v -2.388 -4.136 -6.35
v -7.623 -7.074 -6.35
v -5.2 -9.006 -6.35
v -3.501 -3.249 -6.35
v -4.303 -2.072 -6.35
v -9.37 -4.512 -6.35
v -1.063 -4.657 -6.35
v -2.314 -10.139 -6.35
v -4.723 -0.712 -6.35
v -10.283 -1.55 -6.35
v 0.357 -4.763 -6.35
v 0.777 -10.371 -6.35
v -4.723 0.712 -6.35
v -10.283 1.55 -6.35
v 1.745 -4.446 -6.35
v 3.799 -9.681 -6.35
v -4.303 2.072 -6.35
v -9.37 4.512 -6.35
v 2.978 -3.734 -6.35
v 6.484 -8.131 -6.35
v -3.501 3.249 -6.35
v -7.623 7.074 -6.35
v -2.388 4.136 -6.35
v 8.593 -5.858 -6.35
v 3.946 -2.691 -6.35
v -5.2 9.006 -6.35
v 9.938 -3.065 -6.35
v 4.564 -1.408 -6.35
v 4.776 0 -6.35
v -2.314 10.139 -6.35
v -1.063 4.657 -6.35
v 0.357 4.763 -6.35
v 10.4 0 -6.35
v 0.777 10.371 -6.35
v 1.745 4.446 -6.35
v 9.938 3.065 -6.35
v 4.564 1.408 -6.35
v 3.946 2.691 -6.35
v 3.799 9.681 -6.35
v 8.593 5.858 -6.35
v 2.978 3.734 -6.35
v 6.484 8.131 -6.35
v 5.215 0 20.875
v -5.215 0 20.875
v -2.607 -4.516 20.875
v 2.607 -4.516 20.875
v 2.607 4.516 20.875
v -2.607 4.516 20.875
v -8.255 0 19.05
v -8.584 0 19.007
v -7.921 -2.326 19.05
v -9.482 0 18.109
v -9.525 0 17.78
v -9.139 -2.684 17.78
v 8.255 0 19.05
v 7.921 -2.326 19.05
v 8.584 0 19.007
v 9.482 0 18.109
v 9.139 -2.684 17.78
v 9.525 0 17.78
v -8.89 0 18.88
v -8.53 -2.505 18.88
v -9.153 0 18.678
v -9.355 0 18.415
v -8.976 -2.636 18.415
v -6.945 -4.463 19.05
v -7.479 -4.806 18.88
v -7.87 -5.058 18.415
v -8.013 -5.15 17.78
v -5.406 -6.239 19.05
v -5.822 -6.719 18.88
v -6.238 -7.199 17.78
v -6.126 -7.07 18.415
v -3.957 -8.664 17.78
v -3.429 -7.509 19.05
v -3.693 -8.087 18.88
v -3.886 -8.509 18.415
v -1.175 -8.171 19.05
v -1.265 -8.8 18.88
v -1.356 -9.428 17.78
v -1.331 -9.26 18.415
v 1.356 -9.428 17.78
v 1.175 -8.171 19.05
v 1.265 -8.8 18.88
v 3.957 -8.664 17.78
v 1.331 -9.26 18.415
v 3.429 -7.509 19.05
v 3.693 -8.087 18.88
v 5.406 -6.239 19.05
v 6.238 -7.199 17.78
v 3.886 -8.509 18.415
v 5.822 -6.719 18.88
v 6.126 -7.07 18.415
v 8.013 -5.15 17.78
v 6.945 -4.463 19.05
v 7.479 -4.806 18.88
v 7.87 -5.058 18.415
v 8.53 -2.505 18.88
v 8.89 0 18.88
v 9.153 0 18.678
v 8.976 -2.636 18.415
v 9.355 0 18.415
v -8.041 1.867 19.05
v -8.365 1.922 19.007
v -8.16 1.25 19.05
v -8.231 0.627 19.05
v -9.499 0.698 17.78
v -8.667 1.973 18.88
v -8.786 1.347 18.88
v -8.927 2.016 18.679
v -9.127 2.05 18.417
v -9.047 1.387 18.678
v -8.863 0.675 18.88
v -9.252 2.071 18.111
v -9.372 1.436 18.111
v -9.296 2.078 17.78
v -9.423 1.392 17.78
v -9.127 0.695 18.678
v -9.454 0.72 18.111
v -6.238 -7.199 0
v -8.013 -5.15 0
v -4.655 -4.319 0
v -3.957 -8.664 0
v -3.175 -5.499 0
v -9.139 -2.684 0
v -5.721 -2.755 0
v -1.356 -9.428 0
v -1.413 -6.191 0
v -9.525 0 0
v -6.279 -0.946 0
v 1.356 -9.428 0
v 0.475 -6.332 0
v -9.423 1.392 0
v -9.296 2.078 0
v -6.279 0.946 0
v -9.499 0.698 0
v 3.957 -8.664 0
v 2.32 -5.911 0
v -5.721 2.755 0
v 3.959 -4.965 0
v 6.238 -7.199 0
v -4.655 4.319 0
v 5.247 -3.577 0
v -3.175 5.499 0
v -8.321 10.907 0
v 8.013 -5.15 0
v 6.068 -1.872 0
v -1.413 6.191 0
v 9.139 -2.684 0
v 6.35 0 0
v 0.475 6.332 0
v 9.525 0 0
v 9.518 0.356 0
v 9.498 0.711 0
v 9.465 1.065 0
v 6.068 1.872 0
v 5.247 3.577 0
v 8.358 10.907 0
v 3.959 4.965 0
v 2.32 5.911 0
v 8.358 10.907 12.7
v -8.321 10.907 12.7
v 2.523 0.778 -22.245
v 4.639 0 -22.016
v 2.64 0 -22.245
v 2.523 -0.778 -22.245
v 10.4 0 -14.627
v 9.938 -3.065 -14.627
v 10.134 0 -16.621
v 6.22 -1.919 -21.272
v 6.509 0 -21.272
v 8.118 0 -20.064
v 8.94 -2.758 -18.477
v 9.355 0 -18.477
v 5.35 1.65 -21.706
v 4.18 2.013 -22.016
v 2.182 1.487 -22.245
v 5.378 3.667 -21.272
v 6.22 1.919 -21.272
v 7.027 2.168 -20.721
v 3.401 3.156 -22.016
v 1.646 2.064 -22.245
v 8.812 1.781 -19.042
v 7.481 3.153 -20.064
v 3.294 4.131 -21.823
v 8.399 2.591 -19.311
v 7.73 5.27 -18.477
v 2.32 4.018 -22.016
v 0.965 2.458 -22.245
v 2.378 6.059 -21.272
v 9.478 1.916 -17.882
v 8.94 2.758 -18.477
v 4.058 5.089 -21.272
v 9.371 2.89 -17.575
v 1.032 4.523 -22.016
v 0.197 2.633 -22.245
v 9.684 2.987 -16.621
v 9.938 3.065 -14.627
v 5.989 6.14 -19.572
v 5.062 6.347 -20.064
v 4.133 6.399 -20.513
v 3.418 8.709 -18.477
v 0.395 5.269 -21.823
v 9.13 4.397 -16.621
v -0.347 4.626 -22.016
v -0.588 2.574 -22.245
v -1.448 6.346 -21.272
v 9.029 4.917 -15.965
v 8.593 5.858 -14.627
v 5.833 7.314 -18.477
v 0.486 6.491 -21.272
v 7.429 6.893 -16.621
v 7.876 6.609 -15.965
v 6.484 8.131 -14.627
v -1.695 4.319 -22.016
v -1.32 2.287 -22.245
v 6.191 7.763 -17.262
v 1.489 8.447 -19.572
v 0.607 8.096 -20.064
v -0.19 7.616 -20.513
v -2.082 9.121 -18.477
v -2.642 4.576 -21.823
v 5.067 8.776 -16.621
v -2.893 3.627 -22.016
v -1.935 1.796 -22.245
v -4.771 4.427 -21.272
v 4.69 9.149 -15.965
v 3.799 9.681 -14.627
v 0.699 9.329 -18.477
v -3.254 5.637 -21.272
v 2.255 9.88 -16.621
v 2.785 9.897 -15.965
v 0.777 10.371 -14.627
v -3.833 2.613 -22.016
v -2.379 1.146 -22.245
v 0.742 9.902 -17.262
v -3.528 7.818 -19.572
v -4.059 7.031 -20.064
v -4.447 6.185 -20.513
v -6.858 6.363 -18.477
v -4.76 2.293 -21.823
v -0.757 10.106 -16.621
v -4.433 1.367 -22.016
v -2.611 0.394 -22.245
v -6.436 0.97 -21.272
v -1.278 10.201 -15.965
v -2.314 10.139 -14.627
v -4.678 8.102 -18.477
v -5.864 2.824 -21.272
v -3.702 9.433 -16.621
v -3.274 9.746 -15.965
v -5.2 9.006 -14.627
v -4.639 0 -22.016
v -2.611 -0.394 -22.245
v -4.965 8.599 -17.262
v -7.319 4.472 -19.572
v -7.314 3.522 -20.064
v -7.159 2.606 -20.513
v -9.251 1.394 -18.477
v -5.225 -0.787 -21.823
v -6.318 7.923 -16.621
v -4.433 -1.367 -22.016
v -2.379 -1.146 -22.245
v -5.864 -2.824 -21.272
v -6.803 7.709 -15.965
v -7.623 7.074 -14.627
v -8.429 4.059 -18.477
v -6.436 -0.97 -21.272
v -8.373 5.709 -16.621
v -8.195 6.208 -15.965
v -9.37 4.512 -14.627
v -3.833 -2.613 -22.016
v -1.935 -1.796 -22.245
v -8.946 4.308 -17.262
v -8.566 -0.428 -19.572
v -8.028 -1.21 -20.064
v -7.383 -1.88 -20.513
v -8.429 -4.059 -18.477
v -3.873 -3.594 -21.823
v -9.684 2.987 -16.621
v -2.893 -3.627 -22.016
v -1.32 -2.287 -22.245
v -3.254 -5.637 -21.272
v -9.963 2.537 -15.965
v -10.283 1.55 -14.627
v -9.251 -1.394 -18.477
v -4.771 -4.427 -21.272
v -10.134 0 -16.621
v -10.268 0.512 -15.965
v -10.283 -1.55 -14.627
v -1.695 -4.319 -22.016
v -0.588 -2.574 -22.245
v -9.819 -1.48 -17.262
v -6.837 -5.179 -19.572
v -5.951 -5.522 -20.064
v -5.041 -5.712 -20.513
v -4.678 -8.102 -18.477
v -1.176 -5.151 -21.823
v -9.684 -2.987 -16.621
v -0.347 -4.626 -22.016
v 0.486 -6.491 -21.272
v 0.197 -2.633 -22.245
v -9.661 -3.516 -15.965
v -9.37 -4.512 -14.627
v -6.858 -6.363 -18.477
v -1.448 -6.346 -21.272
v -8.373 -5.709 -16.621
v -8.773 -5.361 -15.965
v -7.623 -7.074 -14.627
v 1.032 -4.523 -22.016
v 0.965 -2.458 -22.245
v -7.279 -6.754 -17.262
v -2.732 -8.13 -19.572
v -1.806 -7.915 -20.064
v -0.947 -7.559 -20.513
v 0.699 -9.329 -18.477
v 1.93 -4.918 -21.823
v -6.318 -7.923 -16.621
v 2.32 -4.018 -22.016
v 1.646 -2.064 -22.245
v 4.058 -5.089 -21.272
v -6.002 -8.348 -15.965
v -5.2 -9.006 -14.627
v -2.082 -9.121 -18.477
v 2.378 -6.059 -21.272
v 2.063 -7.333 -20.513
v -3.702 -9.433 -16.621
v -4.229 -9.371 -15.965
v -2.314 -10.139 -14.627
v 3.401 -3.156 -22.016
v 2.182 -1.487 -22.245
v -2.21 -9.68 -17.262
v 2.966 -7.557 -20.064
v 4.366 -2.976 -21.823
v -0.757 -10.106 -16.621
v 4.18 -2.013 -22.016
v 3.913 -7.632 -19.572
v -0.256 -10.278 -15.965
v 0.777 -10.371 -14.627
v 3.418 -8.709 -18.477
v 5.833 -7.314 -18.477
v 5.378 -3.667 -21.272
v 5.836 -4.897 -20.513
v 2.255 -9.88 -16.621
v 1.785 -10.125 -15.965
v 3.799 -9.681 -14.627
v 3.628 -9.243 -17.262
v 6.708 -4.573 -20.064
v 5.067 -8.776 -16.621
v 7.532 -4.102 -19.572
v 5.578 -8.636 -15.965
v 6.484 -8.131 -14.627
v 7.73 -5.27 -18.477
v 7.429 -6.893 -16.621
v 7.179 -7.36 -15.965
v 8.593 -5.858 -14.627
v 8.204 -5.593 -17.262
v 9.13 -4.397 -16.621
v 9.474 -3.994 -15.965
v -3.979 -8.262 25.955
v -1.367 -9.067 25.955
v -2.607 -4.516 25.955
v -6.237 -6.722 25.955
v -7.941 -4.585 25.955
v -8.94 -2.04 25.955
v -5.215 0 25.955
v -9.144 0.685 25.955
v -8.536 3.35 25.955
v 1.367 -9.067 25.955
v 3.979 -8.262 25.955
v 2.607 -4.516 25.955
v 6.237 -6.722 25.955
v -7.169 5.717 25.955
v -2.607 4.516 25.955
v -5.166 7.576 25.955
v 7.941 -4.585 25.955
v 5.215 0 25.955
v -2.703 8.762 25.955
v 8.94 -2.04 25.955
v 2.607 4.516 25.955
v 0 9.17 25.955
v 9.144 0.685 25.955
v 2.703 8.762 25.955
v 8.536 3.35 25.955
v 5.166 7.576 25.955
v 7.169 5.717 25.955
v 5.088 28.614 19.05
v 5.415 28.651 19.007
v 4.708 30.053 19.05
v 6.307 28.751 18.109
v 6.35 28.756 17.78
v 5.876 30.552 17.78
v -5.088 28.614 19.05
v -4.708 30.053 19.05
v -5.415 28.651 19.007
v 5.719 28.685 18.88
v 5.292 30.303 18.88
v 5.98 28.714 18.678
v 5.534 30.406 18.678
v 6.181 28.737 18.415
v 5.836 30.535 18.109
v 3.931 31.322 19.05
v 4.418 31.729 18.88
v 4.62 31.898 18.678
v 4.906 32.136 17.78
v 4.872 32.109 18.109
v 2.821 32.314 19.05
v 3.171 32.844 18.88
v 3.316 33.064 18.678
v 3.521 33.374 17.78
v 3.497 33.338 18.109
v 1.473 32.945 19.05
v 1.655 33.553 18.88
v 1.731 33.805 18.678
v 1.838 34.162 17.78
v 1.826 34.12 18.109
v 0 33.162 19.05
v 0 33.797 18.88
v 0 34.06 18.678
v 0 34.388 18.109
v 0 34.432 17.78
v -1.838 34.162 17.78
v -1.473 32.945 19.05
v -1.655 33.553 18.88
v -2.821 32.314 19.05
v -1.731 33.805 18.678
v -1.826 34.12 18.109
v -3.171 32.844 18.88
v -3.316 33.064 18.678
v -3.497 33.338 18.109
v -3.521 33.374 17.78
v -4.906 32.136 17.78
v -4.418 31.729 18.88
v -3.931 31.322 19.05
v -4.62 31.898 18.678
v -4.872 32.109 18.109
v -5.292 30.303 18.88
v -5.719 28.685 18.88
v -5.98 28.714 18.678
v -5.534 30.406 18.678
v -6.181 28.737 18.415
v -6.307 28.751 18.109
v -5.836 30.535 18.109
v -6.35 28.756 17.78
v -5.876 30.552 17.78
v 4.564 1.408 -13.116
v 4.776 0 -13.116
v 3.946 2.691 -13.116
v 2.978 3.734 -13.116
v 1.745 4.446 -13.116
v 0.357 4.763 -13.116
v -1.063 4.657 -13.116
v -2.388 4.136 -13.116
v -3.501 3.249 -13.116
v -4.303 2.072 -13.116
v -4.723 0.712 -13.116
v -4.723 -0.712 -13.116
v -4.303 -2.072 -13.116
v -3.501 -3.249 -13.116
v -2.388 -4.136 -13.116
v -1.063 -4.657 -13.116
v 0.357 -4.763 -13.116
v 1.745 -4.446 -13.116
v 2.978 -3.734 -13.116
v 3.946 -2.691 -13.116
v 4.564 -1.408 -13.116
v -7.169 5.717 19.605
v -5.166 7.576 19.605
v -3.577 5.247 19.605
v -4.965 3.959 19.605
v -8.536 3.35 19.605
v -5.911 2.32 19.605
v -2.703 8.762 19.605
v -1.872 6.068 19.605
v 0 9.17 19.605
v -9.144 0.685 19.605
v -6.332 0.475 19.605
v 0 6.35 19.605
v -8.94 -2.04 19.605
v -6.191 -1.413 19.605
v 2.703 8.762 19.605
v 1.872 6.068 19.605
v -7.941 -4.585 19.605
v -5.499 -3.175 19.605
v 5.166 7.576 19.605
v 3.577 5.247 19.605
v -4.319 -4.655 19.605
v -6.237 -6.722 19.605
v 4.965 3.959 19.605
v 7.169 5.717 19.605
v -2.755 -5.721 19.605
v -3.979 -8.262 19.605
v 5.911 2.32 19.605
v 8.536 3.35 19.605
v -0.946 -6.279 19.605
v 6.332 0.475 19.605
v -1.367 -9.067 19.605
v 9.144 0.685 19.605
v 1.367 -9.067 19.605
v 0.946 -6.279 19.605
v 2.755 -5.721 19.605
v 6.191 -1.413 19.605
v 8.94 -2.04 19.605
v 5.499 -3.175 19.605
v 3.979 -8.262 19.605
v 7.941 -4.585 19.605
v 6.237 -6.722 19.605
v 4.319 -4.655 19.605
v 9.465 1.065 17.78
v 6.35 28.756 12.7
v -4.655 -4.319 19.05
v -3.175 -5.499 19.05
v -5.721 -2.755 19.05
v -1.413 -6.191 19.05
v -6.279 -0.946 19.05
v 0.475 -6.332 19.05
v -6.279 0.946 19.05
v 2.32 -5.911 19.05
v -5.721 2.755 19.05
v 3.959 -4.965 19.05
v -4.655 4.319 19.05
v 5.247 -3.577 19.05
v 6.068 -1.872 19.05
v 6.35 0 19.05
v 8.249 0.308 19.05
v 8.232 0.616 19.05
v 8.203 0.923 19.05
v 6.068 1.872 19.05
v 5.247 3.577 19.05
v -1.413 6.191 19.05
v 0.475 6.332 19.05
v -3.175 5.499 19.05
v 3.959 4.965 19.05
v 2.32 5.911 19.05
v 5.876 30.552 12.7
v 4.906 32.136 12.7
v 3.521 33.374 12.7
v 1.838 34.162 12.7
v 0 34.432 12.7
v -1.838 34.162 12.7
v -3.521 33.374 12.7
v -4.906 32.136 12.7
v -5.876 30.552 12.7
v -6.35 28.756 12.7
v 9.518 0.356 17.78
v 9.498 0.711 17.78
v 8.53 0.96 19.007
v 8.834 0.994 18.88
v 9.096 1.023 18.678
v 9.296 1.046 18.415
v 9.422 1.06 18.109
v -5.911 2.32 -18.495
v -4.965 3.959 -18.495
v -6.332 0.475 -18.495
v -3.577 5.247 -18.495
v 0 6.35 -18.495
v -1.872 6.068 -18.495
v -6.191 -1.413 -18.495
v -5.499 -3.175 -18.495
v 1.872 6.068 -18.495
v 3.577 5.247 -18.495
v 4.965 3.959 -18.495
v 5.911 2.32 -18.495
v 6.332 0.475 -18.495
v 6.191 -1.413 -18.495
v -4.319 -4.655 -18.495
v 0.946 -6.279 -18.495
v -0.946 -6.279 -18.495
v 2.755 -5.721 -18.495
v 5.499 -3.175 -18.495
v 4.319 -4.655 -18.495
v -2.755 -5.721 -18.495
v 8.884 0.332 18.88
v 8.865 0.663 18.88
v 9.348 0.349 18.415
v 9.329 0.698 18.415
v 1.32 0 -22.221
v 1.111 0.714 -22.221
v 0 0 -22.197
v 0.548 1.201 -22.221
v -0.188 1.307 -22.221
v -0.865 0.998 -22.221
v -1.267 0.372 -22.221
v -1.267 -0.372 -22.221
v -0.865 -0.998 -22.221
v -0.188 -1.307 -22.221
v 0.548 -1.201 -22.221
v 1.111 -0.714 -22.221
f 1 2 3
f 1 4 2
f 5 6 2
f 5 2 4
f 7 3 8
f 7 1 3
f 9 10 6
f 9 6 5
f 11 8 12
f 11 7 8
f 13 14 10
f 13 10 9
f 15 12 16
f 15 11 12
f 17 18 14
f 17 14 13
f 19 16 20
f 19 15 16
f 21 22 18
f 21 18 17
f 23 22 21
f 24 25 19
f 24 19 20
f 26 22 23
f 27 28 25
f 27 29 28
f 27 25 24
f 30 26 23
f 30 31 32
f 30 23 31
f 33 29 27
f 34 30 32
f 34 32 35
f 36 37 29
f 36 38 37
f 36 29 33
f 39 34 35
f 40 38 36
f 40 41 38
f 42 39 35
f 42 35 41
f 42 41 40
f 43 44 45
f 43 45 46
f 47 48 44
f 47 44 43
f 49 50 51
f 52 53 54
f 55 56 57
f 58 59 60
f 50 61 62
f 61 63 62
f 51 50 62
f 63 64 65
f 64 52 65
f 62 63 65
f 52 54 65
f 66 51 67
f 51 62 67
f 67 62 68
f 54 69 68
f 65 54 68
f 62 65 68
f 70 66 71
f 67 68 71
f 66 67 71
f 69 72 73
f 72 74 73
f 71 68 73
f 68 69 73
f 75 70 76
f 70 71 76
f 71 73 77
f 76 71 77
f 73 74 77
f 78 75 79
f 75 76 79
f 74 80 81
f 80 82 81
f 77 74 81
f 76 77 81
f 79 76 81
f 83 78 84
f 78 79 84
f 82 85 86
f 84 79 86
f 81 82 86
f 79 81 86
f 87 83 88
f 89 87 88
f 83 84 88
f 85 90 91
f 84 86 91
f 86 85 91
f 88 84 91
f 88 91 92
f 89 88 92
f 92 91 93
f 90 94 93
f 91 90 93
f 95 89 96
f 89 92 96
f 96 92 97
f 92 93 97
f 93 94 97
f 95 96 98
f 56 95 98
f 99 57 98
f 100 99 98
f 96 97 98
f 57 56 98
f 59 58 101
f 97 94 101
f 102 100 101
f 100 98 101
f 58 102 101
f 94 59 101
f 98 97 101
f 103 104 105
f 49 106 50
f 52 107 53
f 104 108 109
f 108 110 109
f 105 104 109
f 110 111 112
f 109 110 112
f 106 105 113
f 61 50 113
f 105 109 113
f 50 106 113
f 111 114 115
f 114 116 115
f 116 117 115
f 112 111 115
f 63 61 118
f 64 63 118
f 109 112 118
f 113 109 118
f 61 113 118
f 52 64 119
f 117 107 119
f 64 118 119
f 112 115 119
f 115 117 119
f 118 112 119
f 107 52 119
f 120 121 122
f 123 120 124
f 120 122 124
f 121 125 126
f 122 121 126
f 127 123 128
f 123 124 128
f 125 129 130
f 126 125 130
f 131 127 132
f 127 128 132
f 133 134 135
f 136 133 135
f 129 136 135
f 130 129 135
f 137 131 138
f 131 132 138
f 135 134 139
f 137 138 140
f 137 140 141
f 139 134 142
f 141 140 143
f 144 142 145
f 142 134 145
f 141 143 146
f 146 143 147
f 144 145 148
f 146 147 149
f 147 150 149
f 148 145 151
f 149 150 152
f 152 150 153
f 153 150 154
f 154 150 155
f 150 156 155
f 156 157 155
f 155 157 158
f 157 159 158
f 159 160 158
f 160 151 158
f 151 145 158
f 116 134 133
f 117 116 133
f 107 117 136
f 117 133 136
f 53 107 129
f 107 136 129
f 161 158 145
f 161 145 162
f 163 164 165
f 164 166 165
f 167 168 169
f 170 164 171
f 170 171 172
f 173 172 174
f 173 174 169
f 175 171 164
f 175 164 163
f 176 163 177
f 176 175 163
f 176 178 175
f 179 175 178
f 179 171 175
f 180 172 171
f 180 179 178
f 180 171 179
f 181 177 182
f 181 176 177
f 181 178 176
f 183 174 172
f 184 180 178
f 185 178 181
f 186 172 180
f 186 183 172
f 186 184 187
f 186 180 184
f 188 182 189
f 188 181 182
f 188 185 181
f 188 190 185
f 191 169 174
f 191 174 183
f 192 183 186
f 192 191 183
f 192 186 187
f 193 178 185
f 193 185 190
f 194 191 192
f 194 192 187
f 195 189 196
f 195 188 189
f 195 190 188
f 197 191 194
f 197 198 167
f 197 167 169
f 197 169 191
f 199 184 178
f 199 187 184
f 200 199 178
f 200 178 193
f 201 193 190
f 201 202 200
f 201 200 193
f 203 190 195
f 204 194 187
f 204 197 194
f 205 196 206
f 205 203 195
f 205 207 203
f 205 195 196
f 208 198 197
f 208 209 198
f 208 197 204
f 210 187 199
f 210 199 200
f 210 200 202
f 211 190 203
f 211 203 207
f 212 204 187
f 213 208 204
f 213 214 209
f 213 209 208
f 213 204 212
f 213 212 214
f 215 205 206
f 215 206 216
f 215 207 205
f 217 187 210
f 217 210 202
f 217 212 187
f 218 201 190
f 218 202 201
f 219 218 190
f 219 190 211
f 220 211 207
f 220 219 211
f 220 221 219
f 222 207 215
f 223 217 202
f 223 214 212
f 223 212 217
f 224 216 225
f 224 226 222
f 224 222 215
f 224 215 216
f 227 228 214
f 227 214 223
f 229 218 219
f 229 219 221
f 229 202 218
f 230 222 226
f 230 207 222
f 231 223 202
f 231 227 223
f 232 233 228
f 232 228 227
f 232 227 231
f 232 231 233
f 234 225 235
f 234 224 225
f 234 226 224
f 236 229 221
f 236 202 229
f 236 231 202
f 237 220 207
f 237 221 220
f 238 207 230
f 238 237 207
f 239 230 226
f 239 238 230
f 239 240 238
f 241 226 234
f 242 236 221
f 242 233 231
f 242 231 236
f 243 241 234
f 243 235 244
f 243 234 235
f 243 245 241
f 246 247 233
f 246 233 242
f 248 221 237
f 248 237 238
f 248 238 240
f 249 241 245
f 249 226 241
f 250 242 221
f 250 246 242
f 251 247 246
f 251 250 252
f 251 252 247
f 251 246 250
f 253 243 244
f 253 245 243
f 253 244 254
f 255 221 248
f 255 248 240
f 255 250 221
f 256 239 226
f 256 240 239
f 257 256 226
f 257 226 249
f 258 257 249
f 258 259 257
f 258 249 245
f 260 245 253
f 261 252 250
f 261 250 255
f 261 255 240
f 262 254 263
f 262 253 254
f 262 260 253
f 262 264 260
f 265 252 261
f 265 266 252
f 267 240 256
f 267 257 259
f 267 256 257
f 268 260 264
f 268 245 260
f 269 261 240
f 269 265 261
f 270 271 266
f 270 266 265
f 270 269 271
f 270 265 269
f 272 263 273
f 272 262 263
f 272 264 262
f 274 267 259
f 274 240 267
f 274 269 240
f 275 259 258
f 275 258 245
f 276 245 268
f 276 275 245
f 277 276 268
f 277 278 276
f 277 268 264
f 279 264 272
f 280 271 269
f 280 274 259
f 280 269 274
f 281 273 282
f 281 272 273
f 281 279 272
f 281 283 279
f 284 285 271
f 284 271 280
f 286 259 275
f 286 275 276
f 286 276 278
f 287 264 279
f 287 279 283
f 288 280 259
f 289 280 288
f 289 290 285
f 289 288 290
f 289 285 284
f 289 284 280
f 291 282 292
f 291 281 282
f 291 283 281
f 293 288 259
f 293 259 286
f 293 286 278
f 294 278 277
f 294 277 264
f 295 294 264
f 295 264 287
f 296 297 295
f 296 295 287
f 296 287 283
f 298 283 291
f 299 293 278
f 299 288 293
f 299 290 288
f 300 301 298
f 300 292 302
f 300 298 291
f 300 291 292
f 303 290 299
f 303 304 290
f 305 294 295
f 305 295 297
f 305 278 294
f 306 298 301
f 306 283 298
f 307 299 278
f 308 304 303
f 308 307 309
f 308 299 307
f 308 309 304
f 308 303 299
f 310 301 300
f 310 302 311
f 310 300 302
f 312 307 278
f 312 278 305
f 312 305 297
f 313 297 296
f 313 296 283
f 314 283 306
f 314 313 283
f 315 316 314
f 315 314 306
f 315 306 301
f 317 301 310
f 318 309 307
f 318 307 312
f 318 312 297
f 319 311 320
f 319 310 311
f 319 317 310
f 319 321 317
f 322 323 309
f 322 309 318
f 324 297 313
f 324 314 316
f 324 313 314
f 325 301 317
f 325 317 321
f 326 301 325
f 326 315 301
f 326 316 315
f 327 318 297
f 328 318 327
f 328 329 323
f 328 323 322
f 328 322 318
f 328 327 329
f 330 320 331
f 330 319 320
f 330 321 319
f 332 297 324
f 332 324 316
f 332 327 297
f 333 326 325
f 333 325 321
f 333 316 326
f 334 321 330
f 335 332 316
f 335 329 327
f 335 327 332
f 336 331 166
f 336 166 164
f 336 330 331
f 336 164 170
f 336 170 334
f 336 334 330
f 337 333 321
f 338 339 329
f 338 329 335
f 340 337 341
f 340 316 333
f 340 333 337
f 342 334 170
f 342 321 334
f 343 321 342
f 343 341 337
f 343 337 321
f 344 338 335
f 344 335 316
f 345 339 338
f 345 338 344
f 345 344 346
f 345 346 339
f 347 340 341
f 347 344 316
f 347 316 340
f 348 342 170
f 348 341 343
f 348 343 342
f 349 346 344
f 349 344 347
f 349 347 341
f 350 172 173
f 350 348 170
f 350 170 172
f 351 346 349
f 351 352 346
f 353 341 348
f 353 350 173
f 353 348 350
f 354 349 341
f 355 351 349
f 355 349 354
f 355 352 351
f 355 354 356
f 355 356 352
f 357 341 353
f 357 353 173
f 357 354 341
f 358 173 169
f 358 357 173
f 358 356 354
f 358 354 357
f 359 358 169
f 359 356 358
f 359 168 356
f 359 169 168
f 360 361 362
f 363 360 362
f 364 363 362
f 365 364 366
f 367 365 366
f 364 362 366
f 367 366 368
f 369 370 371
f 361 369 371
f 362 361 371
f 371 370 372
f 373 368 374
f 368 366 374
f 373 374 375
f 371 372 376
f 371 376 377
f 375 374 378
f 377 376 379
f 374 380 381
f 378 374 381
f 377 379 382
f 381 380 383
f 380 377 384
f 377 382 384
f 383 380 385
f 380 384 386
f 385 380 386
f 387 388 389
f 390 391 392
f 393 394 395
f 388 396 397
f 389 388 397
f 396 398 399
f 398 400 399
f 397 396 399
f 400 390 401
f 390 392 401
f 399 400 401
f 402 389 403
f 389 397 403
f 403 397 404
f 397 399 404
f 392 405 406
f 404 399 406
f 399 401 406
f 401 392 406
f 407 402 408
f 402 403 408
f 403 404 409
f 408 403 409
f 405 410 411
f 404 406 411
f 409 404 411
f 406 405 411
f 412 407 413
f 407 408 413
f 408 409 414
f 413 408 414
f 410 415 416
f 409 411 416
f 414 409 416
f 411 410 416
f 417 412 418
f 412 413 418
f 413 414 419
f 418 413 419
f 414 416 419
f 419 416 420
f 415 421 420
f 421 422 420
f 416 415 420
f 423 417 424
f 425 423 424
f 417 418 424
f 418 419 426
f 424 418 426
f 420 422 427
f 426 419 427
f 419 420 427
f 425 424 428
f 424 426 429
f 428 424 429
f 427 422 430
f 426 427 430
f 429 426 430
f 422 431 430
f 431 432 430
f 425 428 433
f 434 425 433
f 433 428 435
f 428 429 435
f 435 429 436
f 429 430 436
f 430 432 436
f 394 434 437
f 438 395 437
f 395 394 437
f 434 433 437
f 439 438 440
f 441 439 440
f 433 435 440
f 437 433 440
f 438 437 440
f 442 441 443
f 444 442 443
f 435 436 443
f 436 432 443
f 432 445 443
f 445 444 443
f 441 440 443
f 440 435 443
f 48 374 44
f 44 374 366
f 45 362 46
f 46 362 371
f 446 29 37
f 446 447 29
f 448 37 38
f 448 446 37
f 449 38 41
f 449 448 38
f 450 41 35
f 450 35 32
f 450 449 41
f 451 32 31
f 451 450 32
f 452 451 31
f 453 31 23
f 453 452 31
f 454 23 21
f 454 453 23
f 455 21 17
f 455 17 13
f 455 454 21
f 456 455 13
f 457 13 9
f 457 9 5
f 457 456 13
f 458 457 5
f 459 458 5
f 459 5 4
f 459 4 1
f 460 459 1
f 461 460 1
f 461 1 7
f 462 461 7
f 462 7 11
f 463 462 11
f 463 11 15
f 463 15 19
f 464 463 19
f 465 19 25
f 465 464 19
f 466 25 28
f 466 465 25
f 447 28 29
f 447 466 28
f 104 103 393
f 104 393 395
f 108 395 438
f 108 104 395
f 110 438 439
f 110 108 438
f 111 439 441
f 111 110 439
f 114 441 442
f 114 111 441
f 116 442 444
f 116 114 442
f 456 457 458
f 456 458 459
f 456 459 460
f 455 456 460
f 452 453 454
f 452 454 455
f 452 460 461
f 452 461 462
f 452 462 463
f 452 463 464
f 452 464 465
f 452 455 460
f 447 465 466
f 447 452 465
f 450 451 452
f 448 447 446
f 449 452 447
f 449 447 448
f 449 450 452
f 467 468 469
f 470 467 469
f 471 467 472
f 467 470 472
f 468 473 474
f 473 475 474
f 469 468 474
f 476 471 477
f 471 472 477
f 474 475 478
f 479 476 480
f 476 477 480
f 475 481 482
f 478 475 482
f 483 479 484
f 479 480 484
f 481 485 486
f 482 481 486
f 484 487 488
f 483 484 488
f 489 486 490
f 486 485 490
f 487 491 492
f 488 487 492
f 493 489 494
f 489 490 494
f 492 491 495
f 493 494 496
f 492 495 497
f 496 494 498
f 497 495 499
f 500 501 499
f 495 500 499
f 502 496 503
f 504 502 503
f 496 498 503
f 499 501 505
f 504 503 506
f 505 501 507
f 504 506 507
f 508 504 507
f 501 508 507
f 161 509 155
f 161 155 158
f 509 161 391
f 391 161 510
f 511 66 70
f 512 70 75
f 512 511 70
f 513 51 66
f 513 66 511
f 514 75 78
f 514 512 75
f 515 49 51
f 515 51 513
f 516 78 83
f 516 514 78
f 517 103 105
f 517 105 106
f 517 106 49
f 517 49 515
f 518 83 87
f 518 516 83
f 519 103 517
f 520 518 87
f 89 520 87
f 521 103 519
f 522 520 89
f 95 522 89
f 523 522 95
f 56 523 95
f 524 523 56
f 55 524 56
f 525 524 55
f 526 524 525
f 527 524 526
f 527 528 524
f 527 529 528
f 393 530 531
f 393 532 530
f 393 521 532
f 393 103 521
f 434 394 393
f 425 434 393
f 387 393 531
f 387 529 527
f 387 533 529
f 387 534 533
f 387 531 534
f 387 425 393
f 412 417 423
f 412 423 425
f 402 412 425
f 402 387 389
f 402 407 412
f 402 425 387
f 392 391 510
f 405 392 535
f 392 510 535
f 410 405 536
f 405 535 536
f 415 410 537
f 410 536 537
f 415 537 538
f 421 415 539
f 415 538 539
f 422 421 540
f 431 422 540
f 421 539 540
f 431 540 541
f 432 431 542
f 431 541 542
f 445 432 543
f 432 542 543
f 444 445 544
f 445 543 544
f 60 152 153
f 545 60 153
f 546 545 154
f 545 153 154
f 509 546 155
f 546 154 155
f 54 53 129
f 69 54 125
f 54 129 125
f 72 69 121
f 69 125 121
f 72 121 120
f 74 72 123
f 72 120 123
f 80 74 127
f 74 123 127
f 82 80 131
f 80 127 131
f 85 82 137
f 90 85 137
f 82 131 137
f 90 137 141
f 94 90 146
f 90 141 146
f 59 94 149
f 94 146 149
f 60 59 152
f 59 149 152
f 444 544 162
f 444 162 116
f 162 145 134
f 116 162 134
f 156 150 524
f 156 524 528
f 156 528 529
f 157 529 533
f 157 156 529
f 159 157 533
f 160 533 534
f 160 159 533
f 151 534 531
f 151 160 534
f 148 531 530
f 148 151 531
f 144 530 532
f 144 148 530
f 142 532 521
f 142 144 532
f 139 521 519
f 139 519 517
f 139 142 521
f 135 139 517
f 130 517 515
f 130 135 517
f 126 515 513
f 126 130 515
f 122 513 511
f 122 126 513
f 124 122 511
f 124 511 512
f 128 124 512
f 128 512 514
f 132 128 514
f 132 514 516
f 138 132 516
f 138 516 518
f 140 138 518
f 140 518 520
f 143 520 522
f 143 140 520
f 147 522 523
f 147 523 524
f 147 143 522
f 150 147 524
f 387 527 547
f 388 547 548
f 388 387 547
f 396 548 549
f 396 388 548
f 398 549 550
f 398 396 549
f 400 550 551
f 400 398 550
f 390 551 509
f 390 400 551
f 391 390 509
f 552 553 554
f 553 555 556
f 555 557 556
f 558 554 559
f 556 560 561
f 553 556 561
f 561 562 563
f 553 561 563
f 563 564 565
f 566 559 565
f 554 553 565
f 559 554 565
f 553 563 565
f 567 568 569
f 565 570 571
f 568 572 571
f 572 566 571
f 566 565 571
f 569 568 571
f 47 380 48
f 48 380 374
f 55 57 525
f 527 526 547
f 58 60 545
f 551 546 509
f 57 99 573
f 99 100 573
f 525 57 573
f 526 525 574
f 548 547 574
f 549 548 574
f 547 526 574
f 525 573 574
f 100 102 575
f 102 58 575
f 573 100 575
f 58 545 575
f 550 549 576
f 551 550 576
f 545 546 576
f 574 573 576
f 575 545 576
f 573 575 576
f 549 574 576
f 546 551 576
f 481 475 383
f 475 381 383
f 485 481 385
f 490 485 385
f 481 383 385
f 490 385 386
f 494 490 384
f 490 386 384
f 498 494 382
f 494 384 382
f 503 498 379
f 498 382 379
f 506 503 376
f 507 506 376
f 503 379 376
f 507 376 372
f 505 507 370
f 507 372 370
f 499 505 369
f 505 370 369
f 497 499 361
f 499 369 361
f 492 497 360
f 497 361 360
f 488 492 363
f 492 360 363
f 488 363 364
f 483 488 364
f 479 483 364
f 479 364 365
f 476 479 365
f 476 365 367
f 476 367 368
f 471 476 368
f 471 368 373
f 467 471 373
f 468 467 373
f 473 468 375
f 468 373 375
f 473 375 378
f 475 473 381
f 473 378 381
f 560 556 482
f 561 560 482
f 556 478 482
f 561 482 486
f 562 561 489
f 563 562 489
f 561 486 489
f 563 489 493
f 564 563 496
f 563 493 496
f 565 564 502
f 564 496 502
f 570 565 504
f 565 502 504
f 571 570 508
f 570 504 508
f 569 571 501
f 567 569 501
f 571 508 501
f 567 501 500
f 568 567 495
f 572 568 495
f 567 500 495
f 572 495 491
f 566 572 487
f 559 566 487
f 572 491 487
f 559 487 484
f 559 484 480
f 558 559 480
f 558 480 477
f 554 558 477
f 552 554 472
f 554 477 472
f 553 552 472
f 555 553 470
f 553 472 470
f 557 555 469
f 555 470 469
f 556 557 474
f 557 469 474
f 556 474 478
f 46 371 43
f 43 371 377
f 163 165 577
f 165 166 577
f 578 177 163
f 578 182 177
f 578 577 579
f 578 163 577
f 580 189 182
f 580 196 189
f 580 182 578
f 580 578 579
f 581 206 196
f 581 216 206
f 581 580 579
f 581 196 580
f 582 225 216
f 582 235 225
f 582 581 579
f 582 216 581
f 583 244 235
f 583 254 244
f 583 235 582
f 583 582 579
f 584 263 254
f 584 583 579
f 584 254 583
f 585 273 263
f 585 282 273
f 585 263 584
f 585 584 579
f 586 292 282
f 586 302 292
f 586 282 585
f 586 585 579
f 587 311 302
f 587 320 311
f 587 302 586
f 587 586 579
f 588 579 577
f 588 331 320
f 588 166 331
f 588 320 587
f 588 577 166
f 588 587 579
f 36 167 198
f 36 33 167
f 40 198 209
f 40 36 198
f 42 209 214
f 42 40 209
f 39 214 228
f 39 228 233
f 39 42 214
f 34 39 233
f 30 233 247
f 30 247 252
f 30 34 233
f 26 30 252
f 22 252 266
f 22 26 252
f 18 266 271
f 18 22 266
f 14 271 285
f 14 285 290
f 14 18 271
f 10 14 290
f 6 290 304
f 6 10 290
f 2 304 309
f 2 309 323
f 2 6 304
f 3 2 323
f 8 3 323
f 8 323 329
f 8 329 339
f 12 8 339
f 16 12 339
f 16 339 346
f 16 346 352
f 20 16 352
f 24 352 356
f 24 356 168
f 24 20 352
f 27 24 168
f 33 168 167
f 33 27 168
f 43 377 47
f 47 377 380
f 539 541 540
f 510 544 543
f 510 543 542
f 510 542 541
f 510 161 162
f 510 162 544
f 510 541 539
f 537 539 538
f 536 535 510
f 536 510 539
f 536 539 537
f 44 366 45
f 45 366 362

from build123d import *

# Parameters (mm, degrees)
F0_R          = 6.35
F1_DEPTH      = 19.05
F2_W          = 33.4682341514
F2_H          = 12.7
F3_DEPTH      = 25.4
F3_DEPTH_BACK = 25.4
F4_R          = 1.27
F8_DEPTH      = 5.08


with BuildPart() as f1:
    # F0 (on Top) → F1 (new body)
    with BuildSketch(Plane.XY):
        with BuildLine():
            Line((-9.2955619432, 2.0780166408), (-9.525, 0))
            ThreePointArc((-9.525, 0), (0, -9.525), (9.525, 0))
            ThreePointArc((9.525, 0), (9.5100605616, 0.5332664573), (9.4652891098, 1.0648601164))
            ThreePointArc((9.4652891098, 1.0648601164), (0.5136373852, 9.5111409219), (-9.2955619432, 2.0780166408))
        make_face()
        Circle(F0_R, mode=Mode.SUBTRACT)
        with BuildLine():
            ThreePointArc((-9.2955619432, 2.0780166408), (-9.4674667285, 1.0453223165), (-9.525, 0))
            Line((-9.525, 0), (-9.2955619432, 2.0780166408))
        make_face()
        with BuildLine():
            Line((-6.35, 28.7559218705), (-9.2955619432, 2.0780166408))
            ThreePointArc((-9.2955619432, 2.0780166408), (0.5136373852, 9.5111409219), (9.4652891098, 1.0648601164))
            Line((9.4652891098, 1.0648601164), (6.35, 28.7559218705))
            ThreePointArc((6.35, 28.7559218705), (0, 34.4315950223), (-6.35, 28.7559218705))
        make_face()
    extrude(amount=F1_DEPTH)

    # F2 (on Right) → F3 (cut, two sides)
    with BuildSketch(Plane.YZ) as f3_sk:
        with Locations((27.6411754268, 6.35)):
            Rectangle(F2_W, F2_H)
    extrude(amount=-F3_DEPTH, mode=Mode.SUBTRACT)
    extrude(f3_sk.sketch, amount=F3_DEPTH_BACK, mode=Mode.SUBTRACT)

    # F4
    f4_edges = [f1.edges().sort_by_distance(p)[0] for p in [
        (7.907645, 14.910391, 19.05),
        (0, 34.431595, 19.05),
        (-7.822781, 15.416969, 19.05),
        (-0.513637, -9.511141, 19.05),
    ]]
    fillet(f4_edges, radius=F4_R)


with BuildPart() as f6:
    # F5 (on Right) → F6 (revolve)
    with BuildSketch(Plane.YZ):
        Polygon((0, 25.9550701678), (0, -18.4949298322), (6.35, -18.4949298322), (6.35, 19.6050701678), (9.1697558698, 19.6050701678), (9.1697558698, 25.9550701678), align=None)
    revolve(axis=Axis((0, 0, 0.1489948481), (0, 0, -1)))

    # F7 (on face) → F8 (cut)
    with BuildSketch(Plane.XY.offset(25.9550701678)):
        Polygon((2.6074026246, -4.5161538215), (5.2148052491, 0), (2.6074026246, 4.5161538215), (-2.6074026246, 4.5161538215), (-5.2148052491, 0), (-2.6074026246, -4.5161538215), align=None)
    extrude(amount=-F8_DEPTH, mode=Mode.SUBTRACT)


with BuildPart() as f11:
    # F10 (on Front) → F11 (revolve)
    with BuildSketch(Plane.XZ):
        with BuildLine():
            ThreePointArc((2.6402827352, -22.2453791648), (8.1182939288, -20.0638530165), (10.3996366436, -14.6266535176))
            Line((10.3996366436, -14.6266535176), (10.3996366436, -6.35))
            Line((10.3996366436, -6.35), (4.7762921357, -6.35))
            Line((4.7762921357, -6.35), (4.7762921357, -13.1163768195))
            Line((4.7762921357, -13.1163768195), (0, -13.1163768195))
            Line((0, -13.1163768195), (0, -22.1970858235))
            Line((0, -22.1970858235), (2.6402827352, -22.2453791648))
        make_face()
    revolve(axis=Axis((0, 0, 0.4469826818), (0, 0, 1)))


solid = Compound([f1.part, f6.part, f11.part])
